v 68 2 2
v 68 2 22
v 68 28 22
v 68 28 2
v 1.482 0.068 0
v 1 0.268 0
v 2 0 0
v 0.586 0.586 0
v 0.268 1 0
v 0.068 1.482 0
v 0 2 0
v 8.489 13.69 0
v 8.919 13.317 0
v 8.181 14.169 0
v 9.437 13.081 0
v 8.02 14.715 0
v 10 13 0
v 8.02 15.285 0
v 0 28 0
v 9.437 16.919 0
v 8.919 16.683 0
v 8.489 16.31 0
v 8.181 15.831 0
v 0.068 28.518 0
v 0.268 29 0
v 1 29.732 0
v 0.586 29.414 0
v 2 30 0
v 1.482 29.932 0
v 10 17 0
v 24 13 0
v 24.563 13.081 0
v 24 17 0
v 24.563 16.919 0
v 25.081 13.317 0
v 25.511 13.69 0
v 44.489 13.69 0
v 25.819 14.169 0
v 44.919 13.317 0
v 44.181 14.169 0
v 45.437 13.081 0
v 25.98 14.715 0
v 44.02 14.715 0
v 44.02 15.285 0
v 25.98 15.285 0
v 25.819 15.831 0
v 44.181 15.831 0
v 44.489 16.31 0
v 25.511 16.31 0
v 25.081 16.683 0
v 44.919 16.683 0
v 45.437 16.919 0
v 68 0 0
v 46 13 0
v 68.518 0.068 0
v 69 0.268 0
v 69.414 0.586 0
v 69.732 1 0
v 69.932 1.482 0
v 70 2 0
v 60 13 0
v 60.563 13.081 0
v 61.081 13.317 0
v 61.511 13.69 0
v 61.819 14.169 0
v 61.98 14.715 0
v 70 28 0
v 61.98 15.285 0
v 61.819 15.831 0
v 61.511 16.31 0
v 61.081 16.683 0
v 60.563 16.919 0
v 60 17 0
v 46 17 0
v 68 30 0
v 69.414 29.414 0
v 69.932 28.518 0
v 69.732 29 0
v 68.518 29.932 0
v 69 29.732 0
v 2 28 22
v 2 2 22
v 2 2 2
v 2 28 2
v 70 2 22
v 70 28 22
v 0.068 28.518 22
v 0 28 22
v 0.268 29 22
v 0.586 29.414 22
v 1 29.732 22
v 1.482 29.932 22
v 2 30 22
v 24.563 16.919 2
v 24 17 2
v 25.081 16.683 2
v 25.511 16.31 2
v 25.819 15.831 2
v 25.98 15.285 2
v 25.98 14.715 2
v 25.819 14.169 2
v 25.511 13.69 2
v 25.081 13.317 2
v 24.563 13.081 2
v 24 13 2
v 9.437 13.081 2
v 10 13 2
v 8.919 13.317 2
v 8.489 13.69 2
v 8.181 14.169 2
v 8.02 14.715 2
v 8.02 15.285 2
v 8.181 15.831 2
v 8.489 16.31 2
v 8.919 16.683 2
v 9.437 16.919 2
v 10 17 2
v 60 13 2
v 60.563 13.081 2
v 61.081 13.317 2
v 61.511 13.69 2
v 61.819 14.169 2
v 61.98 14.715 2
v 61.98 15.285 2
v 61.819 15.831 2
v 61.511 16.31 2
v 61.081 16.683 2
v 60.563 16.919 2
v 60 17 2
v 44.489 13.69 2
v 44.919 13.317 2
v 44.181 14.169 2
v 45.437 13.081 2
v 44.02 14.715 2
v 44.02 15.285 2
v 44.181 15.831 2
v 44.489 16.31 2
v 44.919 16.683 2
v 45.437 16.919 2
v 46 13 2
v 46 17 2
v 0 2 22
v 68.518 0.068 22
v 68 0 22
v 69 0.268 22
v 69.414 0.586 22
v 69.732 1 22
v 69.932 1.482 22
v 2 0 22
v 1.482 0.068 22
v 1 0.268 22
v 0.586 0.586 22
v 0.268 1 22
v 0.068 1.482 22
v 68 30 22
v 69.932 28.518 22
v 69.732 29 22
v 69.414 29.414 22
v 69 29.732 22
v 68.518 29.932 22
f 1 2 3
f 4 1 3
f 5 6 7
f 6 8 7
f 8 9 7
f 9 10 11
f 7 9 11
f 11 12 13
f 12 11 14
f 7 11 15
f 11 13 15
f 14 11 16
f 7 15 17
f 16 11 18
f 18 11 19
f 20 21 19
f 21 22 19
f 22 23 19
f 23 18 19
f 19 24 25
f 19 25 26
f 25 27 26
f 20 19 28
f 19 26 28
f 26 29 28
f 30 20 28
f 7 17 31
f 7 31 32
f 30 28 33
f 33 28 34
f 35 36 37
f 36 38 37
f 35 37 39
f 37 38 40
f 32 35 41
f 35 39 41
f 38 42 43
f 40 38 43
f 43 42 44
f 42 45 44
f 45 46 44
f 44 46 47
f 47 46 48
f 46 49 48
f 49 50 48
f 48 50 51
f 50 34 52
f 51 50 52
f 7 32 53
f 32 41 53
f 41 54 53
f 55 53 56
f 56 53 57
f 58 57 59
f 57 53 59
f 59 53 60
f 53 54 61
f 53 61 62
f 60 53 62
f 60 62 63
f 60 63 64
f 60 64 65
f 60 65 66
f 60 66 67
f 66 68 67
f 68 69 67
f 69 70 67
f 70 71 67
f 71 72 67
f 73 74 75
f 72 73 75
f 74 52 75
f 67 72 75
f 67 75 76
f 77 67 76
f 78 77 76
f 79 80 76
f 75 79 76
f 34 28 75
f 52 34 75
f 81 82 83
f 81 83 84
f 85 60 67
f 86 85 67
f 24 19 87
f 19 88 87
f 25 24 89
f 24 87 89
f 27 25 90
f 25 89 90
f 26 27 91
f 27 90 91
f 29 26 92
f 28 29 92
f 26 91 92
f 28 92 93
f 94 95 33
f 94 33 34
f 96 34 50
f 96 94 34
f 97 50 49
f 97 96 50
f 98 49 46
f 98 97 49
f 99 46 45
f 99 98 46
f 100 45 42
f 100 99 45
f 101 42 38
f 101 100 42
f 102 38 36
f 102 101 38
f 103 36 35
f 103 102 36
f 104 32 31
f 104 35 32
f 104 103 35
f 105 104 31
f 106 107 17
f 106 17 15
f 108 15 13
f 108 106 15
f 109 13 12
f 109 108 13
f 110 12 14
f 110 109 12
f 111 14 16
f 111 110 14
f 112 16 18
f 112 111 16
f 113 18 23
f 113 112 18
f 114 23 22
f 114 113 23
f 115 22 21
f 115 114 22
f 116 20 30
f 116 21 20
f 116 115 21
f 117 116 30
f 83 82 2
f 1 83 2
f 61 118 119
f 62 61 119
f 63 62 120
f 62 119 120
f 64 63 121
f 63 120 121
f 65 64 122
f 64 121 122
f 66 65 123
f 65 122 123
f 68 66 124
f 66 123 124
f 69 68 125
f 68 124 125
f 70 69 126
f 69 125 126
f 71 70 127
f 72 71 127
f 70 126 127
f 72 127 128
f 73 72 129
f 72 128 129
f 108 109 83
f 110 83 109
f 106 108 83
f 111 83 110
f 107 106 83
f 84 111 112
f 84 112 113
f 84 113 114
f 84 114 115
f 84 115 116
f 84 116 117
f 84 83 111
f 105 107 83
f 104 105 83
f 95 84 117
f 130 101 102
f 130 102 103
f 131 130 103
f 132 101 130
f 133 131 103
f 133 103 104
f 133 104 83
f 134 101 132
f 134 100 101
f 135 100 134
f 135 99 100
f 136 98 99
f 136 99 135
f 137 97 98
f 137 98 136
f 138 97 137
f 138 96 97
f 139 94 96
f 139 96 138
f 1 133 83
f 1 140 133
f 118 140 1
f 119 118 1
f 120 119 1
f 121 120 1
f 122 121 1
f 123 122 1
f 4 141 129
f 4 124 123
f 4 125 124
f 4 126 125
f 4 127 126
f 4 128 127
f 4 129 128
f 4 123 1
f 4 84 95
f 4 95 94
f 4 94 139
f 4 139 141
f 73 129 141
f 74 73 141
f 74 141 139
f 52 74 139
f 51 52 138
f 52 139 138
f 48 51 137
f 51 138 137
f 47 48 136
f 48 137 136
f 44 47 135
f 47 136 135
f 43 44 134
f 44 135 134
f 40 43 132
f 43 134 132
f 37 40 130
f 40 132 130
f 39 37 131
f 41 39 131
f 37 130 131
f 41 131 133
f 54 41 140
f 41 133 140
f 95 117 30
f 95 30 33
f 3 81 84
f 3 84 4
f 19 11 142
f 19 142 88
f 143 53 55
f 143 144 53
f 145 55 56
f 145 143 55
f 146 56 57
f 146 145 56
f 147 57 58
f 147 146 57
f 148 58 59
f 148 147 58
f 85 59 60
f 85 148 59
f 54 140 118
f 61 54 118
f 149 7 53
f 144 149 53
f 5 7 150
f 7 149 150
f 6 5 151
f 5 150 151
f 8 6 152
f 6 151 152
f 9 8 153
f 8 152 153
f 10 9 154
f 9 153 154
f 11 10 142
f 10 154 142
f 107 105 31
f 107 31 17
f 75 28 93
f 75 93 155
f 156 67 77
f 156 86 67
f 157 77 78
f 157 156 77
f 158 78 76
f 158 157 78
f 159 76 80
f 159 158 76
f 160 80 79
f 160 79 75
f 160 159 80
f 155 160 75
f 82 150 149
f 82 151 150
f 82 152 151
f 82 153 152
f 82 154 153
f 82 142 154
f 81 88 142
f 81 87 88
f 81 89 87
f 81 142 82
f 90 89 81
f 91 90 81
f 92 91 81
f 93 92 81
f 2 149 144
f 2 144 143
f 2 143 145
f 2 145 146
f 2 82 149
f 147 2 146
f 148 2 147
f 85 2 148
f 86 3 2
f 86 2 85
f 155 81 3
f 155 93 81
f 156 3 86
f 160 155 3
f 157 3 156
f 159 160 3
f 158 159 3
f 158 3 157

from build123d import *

# Parameters (mm, degrees)
CROQUIS1_W              = 70
CROQUIS1_H              = 30
SALIENTE_EXTRUIR4_DEPTH = 22
CROQUIS5_W              = 66
CROQUIS5_H              = 26
CORTAR_EXTRUIR1_DEPTH   = 20
CORTAR_EXTRUIR3_DEPTH   = 20
REDONDEO2_R             = 2
REDONDEO3_R             = 2
REDONDEO4_R             = 2
REDONDEO5_R             = 2


with BuildPart() as part:
    # Croquis1 → Saliente-Extruir4 (new body)
    with BuildSketch(Plane.XY):
        with Locations((35, 15)):
            Rectangle(CROQUIS1_W, CROQUIS1_H)
    extrude(amount=SALIENTE_EXTRUIR4_DEPTH)

    # Croquis5 → Cortar-Extruir1 (cut)
    with BuildSketch(Plane.XY.offset(22)):
        with Locations((35, 15)):
            Rectangle(CROQUIS5_W, CROQUIS5_H)
    extrude(amount=-CORTAR_EXTRUIR1_DEPTH, mode=Mode.SUBTRACT)

    # Croquis6 → Cortar-Extruir3 (cut)
    with BuildSketch(Plane.XY.offset(2)):
        with BuildLine():
            Line((10, 17), (24, 17))
            ThreePointArc((24, 17), (26, 15), (24, 13))
            Line((24, 13), (10, 13))
            ThreePointArc((10, 13), (8, 15), (10, 17))
        make_face()
        with BuildLine():
            Line((60, 17), (46, 17))
            ThreePointArc((46, 17), (44, 15), (46, 13))
            Line((46, 13), (60, 13))
            ThreePointArc((60, 13), (62, 15), (60, 17))
        make_face()
    extrude(amount=-CORTAR_EXTRUIR3_DEPTH, mode=Mode.SUBTRACT)

    # Redondeo2
    redondeo2_edges = [part.edges().sort_by_distance(p)[0] for p in [
        (70, 0, 11),
    ]]
    fillet(redondeo2_edges, radius=REDONDEO2_R)

    # Redondeo3
    redondeo3_edges = [part.edges().sort_by_distance(p)[0] for p in [
        (70, 30, 11),
    ]]
    fillet(redondeo3_edges, radius=REDONDEO3_R)

    # Redondeo4
    redondeo4_edges = [part.edges().sort_by_distance(p)[0] for p in [
        (0, 0, 11),
    ]]
    fillet(redondeo4_edges, radius=REDONDEO4_R)

    # Redondeo5
    redondeo5_edges = [part.edges().sort_by_distance(p)[0] for p in [
        (0, 30, 11),
    ]]
    fillet(redondeo5_edges, radius=REDONDEO5_R)


solid = part.part
